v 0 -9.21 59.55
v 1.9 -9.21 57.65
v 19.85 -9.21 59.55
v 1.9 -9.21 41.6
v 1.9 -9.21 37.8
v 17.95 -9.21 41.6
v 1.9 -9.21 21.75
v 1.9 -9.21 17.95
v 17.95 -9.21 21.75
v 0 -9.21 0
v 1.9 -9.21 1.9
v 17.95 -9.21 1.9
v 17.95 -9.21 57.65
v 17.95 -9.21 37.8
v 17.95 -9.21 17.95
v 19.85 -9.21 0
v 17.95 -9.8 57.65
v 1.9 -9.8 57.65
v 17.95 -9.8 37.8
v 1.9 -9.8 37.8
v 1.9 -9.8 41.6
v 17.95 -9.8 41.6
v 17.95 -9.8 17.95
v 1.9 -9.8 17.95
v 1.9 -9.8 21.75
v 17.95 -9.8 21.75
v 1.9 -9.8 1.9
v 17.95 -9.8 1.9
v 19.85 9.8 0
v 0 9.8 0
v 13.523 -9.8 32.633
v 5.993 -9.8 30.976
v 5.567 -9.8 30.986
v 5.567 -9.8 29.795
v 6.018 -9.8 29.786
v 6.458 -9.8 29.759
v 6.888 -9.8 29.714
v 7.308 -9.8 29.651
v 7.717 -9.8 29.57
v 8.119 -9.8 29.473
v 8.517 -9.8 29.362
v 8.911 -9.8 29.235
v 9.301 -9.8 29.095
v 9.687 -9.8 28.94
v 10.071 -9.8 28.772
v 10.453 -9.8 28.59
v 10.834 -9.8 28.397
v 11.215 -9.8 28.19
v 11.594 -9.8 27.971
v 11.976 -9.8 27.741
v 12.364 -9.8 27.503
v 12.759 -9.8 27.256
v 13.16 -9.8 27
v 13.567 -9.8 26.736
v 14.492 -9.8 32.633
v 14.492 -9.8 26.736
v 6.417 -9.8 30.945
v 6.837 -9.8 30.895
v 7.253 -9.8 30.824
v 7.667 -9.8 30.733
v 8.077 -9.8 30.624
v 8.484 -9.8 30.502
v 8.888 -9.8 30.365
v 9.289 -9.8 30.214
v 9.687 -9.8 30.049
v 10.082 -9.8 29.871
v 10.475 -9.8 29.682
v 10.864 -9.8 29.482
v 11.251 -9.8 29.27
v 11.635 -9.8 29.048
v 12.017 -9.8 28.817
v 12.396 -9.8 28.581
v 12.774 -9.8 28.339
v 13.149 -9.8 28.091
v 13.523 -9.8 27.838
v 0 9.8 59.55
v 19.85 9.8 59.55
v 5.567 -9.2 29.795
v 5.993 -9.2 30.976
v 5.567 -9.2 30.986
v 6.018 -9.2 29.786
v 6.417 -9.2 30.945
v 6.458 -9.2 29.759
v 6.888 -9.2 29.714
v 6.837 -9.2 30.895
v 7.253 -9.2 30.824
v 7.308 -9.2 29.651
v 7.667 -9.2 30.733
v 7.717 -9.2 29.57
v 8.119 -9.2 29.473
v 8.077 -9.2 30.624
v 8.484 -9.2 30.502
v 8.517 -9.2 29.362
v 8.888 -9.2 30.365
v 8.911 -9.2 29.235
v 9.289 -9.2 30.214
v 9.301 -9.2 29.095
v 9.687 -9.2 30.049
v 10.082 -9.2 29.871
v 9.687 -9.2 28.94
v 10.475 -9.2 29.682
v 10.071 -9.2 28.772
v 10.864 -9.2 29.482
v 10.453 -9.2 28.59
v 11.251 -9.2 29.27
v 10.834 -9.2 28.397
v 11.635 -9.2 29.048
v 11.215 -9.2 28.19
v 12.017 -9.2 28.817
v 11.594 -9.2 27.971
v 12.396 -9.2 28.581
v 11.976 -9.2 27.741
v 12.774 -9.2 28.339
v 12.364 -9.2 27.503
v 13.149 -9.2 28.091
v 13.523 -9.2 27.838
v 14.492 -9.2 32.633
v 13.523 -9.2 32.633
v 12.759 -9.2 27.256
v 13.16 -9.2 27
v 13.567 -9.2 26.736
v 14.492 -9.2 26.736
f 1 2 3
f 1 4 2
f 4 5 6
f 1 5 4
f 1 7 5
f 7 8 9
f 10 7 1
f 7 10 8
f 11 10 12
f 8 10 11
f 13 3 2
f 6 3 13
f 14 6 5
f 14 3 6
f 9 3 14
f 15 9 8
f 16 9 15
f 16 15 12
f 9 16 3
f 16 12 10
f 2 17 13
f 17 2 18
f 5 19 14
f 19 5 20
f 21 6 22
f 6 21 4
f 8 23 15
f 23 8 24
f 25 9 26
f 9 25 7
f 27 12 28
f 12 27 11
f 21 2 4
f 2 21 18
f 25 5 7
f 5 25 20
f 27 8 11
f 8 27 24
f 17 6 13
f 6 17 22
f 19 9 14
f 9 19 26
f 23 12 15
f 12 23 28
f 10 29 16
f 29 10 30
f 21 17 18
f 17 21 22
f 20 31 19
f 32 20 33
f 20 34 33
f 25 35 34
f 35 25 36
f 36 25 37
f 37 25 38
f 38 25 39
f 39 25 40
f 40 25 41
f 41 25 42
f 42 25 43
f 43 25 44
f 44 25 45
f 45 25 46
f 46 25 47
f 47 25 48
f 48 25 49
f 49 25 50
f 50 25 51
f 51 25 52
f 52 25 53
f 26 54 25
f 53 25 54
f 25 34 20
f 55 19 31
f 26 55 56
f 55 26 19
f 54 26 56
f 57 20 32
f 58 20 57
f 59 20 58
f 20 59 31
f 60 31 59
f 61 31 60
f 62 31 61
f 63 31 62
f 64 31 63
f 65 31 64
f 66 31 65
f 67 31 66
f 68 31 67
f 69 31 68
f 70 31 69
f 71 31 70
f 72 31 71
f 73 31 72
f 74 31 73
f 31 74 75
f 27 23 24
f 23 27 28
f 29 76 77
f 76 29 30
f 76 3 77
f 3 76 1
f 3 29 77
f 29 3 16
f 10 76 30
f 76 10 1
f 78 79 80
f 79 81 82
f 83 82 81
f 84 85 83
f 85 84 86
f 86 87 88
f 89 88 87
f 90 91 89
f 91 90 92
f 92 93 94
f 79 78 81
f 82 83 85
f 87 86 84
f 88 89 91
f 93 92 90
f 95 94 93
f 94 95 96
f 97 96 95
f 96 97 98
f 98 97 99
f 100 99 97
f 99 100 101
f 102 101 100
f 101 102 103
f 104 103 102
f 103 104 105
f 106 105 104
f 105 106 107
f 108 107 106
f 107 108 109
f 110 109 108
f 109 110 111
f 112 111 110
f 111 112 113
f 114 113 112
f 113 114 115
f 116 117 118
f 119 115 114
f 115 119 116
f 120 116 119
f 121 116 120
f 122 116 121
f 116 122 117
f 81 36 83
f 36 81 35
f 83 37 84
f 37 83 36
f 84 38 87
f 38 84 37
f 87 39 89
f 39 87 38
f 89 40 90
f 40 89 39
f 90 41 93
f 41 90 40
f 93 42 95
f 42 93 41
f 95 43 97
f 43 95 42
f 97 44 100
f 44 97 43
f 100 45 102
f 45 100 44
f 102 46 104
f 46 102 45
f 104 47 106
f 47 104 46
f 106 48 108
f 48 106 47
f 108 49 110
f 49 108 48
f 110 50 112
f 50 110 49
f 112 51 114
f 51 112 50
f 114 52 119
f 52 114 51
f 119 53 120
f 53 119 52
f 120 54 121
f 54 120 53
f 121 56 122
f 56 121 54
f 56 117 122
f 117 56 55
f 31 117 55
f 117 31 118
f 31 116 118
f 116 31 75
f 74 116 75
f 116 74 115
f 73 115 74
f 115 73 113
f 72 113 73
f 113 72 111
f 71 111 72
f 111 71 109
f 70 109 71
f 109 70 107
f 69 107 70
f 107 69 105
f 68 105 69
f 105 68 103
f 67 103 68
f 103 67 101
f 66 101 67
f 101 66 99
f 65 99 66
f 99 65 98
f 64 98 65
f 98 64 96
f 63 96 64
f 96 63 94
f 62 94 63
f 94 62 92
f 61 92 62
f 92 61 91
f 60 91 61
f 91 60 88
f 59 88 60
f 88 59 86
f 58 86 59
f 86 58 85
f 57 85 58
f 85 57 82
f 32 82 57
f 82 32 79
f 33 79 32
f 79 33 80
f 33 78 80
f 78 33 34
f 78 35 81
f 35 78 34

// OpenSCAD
/*

  puzzle_part_7.scad

  Winston Freer Tile Puzzle: Part 7
      
  (c) olikraus@gmail.com

  This work is licensed under the Creative Commons Attribution-NonCommercial-ShareAlike 4.0 International License. 
  To view a copy of this license, visit http://creativecommons.org/licenses/by-nc-sa/4.0/.
    
*/

include <winston_freer.scad>;


rotate([0,90,-90]) 
translate([-5*ts,0,0])
part7();
